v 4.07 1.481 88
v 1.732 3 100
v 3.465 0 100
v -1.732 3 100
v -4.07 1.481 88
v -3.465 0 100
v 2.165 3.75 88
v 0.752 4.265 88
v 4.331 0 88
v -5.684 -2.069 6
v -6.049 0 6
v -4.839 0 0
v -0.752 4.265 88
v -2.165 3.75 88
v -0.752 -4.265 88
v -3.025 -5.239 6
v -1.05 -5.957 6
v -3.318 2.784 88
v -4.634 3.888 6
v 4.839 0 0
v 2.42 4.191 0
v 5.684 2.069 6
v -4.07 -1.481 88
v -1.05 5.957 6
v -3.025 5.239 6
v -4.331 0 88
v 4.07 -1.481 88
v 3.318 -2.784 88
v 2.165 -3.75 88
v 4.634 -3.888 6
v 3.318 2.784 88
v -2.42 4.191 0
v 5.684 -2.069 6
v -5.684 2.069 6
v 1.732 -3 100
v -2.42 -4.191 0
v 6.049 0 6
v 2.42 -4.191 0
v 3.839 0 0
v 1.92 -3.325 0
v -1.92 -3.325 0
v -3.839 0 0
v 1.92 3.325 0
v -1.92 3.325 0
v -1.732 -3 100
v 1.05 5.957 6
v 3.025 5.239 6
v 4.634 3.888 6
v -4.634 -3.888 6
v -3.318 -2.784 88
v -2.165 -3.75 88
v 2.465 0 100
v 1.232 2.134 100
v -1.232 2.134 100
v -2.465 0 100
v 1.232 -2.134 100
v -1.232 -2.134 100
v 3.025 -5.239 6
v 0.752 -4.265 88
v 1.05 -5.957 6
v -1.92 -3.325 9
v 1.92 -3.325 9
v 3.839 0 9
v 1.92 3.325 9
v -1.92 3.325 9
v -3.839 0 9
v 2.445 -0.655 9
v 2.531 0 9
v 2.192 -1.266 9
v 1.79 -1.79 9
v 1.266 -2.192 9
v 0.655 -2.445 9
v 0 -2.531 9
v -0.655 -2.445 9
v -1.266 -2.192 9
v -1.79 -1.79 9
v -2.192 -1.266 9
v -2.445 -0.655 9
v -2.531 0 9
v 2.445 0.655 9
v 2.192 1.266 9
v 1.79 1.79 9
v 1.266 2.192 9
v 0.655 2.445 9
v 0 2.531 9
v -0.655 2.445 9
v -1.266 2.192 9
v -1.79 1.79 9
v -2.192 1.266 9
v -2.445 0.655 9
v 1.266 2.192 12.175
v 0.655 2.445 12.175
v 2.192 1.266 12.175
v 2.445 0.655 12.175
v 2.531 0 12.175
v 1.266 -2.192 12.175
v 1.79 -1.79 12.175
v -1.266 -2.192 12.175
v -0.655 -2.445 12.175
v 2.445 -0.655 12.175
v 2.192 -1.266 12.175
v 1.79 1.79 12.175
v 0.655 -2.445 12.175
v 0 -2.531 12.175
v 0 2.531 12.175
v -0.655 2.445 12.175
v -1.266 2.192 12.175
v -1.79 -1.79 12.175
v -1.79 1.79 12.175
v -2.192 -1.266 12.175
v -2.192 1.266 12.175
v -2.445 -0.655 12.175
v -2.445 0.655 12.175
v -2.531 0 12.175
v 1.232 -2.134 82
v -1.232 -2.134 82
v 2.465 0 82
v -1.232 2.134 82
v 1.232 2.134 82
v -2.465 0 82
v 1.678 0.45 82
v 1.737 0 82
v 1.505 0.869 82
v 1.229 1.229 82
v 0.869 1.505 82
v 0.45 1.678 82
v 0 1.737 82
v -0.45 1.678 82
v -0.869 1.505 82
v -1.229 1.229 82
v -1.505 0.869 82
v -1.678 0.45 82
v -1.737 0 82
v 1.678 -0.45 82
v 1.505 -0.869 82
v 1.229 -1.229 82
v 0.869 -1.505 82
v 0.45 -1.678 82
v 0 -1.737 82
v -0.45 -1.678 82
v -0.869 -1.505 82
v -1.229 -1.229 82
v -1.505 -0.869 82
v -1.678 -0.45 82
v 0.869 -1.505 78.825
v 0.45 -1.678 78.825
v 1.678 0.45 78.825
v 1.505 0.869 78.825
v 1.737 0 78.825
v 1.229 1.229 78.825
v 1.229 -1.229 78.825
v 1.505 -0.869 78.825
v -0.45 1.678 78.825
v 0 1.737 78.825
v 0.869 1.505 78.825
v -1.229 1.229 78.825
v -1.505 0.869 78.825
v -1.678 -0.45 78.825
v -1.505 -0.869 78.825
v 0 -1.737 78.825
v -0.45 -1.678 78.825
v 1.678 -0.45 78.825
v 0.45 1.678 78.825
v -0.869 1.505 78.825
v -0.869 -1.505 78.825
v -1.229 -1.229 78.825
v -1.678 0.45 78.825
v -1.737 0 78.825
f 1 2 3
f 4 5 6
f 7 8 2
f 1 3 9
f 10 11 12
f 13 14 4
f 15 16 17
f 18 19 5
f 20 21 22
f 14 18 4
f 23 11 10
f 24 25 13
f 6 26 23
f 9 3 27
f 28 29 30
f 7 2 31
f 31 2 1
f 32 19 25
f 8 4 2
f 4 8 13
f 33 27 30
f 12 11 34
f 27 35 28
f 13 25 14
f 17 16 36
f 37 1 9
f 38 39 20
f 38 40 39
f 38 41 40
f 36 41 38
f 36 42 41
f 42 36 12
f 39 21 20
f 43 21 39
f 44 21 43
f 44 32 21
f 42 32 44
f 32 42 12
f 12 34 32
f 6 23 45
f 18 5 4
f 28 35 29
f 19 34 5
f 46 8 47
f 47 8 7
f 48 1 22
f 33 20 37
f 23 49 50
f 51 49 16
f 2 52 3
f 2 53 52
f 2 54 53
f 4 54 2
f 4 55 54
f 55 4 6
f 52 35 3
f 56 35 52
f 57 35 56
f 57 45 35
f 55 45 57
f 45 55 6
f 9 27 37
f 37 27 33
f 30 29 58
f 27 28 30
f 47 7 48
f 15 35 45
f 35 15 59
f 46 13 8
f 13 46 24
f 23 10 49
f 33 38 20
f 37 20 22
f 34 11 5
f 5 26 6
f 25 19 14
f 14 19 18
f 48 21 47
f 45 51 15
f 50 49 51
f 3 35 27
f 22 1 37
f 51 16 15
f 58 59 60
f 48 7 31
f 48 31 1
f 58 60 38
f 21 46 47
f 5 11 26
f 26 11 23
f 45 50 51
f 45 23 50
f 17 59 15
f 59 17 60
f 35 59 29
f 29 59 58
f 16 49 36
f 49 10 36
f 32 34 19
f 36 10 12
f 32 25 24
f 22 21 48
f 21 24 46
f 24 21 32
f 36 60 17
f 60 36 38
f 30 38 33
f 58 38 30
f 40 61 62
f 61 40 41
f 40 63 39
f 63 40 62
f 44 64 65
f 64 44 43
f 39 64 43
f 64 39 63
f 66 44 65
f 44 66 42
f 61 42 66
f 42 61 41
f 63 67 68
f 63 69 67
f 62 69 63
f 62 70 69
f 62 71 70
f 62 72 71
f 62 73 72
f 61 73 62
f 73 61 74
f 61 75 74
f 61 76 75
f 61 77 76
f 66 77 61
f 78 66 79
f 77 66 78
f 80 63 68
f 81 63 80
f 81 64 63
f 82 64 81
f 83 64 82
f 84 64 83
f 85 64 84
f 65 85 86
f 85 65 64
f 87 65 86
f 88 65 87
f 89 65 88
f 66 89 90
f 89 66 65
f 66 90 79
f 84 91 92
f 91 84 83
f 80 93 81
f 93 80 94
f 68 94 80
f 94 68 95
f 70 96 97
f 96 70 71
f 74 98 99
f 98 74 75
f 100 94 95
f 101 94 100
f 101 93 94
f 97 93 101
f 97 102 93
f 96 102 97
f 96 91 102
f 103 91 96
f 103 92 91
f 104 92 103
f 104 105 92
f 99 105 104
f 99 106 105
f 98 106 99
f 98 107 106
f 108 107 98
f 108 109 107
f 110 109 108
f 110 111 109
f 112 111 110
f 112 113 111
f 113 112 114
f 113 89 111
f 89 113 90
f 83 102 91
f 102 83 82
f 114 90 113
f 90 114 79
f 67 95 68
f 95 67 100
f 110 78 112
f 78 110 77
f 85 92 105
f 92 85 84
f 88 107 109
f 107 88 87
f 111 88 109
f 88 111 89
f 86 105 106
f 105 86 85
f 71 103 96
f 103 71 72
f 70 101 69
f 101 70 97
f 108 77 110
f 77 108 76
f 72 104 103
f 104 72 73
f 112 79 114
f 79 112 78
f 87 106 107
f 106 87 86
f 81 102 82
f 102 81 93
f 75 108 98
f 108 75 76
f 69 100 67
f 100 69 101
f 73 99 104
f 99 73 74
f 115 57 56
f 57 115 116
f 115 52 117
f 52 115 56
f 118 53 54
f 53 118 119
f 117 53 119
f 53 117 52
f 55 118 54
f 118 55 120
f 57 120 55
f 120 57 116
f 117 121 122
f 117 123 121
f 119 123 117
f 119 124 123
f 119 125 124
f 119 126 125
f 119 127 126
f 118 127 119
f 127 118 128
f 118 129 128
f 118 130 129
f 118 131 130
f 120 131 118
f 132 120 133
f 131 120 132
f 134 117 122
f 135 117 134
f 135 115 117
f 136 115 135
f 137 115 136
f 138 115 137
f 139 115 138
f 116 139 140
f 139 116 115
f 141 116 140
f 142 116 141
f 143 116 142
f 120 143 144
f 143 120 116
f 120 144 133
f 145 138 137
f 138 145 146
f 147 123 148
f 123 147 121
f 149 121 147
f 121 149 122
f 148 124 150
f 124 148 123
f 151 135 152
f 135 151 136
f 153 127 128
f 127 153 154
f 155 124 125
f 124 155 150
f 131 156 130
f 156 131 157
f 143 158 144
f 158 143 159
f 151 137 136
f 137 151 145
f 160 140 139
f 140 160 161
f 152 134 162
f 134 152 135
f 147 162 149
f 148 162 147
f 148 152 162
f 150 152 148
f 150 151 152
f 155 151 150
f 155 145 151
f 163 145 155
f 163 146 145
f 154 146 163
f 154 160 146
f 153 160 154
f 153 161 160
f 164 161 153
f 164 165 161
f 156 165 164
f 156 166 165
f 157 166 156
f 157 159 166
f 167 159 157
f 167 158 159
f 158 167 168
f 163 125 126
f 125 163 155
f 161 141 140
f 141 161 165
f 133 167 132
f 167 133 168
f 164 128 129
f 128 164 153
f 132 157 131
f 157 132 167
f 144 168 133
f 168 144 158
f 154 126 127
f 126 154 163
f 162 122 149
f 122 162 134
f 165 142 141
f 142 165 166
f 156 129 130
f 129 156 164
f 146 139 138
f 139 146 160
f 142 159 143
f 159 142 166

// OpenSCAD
/* [Handle] */

// (total tool length in mm)
length = 100;

// (minimum wall thickness in mm)
side_thickness = 1;

// (number of sides)
handle_sides = 18; //  [6:6:60]

// (multiplier of bit radius)
handle_thickness = 1.25;

// (wiggle room for the bits in mm)
tolerance = 0.3;

/* [Bit 1] */

// (in mm)
bit1_socket_diameter = 6.35;

// (in mm)
bit1_socket_depth = 9;

// (in mm)
bit1_magnet_diameter = 4.7625;

// (in mm)
bit1_magnet_depth = 3.175;

/* [Bit 2] */

// (in mm)
bit2_socket_diameter = 3.96875;

// (in mm)
bit2_socket_depth = 18;

// (in mm)
bit2_magnet_diameter = 3.175;

// (in mm)
bit2_magnet_depth = 3.175;

bit1_socket_radius = ( bit1_socket_diameter + tolerance ) / 2;
bit1_socket_height = bit1_socket_depth + bit1_magnet_depth;
bit1_inner_radius = bit1_socket_radius / cos( 180 / 6 );
bit1_external_radius = bit1_inner_radius + side_thickness;

bit2_socket_radius = ( bit2_socket_diameter + tolerance ) / 2;
bit2_socket_height = bit2_socket_depth + bit2_magnet_depth;
bit2_inner_radius = bit2_socket_radius / cos( 180 / 6 );
bit2_external_radius = bit2_inner_radius + side_thickness;

difference(){
    hull(){
        cylinder( h = length, r1 = bit1_external_radius, r2 = bit2_external_radius, $fn = 6 );
        translate( v = [ 0, 0, bit1_socket_depth / 1.5 ] ){
            cylinder( h = ( length - ( ( bit1_socket_depth + bit2_socket_depth ) / 1.5 ) ), r1 = bit1_external_radius * handle_thickness, r2 = bit2_external_radius * handle_thickness, $fn = handle_sides );
        }
    }        
	translate( v = [ 0, 0, -1 ] ){
        cylinder( h = bit1_socket_depth + 1, r = bit1_inner_radius, $fn = 6 );
	}
	translate( v = [ 0, 0, -1 ] ){
        cylinder( h = bit1_socket_depth + bit1_magnet_depth + 1, r = ( bit1_magnet_diameter + tolerance ) / 2, $fn = 24 );
	}
	translate( v = [ 0, 0, length - bit2_socket_depth ] ){
        cylinder( h = bit2_socket_depth + 1, r = bit2_inner_radius, $fn = 6 );
	}
	translate( v = [ 0, 0, length - ( bit2_socket_depth + bit2_magnet_depth ) ] ){
        cylinder( h = bit2_socket_depth + bit2_magnet_depth + 1, r = ( bit2_magnet_diameter + tolerance ) / 2, $fn = 24 );
	}
}
